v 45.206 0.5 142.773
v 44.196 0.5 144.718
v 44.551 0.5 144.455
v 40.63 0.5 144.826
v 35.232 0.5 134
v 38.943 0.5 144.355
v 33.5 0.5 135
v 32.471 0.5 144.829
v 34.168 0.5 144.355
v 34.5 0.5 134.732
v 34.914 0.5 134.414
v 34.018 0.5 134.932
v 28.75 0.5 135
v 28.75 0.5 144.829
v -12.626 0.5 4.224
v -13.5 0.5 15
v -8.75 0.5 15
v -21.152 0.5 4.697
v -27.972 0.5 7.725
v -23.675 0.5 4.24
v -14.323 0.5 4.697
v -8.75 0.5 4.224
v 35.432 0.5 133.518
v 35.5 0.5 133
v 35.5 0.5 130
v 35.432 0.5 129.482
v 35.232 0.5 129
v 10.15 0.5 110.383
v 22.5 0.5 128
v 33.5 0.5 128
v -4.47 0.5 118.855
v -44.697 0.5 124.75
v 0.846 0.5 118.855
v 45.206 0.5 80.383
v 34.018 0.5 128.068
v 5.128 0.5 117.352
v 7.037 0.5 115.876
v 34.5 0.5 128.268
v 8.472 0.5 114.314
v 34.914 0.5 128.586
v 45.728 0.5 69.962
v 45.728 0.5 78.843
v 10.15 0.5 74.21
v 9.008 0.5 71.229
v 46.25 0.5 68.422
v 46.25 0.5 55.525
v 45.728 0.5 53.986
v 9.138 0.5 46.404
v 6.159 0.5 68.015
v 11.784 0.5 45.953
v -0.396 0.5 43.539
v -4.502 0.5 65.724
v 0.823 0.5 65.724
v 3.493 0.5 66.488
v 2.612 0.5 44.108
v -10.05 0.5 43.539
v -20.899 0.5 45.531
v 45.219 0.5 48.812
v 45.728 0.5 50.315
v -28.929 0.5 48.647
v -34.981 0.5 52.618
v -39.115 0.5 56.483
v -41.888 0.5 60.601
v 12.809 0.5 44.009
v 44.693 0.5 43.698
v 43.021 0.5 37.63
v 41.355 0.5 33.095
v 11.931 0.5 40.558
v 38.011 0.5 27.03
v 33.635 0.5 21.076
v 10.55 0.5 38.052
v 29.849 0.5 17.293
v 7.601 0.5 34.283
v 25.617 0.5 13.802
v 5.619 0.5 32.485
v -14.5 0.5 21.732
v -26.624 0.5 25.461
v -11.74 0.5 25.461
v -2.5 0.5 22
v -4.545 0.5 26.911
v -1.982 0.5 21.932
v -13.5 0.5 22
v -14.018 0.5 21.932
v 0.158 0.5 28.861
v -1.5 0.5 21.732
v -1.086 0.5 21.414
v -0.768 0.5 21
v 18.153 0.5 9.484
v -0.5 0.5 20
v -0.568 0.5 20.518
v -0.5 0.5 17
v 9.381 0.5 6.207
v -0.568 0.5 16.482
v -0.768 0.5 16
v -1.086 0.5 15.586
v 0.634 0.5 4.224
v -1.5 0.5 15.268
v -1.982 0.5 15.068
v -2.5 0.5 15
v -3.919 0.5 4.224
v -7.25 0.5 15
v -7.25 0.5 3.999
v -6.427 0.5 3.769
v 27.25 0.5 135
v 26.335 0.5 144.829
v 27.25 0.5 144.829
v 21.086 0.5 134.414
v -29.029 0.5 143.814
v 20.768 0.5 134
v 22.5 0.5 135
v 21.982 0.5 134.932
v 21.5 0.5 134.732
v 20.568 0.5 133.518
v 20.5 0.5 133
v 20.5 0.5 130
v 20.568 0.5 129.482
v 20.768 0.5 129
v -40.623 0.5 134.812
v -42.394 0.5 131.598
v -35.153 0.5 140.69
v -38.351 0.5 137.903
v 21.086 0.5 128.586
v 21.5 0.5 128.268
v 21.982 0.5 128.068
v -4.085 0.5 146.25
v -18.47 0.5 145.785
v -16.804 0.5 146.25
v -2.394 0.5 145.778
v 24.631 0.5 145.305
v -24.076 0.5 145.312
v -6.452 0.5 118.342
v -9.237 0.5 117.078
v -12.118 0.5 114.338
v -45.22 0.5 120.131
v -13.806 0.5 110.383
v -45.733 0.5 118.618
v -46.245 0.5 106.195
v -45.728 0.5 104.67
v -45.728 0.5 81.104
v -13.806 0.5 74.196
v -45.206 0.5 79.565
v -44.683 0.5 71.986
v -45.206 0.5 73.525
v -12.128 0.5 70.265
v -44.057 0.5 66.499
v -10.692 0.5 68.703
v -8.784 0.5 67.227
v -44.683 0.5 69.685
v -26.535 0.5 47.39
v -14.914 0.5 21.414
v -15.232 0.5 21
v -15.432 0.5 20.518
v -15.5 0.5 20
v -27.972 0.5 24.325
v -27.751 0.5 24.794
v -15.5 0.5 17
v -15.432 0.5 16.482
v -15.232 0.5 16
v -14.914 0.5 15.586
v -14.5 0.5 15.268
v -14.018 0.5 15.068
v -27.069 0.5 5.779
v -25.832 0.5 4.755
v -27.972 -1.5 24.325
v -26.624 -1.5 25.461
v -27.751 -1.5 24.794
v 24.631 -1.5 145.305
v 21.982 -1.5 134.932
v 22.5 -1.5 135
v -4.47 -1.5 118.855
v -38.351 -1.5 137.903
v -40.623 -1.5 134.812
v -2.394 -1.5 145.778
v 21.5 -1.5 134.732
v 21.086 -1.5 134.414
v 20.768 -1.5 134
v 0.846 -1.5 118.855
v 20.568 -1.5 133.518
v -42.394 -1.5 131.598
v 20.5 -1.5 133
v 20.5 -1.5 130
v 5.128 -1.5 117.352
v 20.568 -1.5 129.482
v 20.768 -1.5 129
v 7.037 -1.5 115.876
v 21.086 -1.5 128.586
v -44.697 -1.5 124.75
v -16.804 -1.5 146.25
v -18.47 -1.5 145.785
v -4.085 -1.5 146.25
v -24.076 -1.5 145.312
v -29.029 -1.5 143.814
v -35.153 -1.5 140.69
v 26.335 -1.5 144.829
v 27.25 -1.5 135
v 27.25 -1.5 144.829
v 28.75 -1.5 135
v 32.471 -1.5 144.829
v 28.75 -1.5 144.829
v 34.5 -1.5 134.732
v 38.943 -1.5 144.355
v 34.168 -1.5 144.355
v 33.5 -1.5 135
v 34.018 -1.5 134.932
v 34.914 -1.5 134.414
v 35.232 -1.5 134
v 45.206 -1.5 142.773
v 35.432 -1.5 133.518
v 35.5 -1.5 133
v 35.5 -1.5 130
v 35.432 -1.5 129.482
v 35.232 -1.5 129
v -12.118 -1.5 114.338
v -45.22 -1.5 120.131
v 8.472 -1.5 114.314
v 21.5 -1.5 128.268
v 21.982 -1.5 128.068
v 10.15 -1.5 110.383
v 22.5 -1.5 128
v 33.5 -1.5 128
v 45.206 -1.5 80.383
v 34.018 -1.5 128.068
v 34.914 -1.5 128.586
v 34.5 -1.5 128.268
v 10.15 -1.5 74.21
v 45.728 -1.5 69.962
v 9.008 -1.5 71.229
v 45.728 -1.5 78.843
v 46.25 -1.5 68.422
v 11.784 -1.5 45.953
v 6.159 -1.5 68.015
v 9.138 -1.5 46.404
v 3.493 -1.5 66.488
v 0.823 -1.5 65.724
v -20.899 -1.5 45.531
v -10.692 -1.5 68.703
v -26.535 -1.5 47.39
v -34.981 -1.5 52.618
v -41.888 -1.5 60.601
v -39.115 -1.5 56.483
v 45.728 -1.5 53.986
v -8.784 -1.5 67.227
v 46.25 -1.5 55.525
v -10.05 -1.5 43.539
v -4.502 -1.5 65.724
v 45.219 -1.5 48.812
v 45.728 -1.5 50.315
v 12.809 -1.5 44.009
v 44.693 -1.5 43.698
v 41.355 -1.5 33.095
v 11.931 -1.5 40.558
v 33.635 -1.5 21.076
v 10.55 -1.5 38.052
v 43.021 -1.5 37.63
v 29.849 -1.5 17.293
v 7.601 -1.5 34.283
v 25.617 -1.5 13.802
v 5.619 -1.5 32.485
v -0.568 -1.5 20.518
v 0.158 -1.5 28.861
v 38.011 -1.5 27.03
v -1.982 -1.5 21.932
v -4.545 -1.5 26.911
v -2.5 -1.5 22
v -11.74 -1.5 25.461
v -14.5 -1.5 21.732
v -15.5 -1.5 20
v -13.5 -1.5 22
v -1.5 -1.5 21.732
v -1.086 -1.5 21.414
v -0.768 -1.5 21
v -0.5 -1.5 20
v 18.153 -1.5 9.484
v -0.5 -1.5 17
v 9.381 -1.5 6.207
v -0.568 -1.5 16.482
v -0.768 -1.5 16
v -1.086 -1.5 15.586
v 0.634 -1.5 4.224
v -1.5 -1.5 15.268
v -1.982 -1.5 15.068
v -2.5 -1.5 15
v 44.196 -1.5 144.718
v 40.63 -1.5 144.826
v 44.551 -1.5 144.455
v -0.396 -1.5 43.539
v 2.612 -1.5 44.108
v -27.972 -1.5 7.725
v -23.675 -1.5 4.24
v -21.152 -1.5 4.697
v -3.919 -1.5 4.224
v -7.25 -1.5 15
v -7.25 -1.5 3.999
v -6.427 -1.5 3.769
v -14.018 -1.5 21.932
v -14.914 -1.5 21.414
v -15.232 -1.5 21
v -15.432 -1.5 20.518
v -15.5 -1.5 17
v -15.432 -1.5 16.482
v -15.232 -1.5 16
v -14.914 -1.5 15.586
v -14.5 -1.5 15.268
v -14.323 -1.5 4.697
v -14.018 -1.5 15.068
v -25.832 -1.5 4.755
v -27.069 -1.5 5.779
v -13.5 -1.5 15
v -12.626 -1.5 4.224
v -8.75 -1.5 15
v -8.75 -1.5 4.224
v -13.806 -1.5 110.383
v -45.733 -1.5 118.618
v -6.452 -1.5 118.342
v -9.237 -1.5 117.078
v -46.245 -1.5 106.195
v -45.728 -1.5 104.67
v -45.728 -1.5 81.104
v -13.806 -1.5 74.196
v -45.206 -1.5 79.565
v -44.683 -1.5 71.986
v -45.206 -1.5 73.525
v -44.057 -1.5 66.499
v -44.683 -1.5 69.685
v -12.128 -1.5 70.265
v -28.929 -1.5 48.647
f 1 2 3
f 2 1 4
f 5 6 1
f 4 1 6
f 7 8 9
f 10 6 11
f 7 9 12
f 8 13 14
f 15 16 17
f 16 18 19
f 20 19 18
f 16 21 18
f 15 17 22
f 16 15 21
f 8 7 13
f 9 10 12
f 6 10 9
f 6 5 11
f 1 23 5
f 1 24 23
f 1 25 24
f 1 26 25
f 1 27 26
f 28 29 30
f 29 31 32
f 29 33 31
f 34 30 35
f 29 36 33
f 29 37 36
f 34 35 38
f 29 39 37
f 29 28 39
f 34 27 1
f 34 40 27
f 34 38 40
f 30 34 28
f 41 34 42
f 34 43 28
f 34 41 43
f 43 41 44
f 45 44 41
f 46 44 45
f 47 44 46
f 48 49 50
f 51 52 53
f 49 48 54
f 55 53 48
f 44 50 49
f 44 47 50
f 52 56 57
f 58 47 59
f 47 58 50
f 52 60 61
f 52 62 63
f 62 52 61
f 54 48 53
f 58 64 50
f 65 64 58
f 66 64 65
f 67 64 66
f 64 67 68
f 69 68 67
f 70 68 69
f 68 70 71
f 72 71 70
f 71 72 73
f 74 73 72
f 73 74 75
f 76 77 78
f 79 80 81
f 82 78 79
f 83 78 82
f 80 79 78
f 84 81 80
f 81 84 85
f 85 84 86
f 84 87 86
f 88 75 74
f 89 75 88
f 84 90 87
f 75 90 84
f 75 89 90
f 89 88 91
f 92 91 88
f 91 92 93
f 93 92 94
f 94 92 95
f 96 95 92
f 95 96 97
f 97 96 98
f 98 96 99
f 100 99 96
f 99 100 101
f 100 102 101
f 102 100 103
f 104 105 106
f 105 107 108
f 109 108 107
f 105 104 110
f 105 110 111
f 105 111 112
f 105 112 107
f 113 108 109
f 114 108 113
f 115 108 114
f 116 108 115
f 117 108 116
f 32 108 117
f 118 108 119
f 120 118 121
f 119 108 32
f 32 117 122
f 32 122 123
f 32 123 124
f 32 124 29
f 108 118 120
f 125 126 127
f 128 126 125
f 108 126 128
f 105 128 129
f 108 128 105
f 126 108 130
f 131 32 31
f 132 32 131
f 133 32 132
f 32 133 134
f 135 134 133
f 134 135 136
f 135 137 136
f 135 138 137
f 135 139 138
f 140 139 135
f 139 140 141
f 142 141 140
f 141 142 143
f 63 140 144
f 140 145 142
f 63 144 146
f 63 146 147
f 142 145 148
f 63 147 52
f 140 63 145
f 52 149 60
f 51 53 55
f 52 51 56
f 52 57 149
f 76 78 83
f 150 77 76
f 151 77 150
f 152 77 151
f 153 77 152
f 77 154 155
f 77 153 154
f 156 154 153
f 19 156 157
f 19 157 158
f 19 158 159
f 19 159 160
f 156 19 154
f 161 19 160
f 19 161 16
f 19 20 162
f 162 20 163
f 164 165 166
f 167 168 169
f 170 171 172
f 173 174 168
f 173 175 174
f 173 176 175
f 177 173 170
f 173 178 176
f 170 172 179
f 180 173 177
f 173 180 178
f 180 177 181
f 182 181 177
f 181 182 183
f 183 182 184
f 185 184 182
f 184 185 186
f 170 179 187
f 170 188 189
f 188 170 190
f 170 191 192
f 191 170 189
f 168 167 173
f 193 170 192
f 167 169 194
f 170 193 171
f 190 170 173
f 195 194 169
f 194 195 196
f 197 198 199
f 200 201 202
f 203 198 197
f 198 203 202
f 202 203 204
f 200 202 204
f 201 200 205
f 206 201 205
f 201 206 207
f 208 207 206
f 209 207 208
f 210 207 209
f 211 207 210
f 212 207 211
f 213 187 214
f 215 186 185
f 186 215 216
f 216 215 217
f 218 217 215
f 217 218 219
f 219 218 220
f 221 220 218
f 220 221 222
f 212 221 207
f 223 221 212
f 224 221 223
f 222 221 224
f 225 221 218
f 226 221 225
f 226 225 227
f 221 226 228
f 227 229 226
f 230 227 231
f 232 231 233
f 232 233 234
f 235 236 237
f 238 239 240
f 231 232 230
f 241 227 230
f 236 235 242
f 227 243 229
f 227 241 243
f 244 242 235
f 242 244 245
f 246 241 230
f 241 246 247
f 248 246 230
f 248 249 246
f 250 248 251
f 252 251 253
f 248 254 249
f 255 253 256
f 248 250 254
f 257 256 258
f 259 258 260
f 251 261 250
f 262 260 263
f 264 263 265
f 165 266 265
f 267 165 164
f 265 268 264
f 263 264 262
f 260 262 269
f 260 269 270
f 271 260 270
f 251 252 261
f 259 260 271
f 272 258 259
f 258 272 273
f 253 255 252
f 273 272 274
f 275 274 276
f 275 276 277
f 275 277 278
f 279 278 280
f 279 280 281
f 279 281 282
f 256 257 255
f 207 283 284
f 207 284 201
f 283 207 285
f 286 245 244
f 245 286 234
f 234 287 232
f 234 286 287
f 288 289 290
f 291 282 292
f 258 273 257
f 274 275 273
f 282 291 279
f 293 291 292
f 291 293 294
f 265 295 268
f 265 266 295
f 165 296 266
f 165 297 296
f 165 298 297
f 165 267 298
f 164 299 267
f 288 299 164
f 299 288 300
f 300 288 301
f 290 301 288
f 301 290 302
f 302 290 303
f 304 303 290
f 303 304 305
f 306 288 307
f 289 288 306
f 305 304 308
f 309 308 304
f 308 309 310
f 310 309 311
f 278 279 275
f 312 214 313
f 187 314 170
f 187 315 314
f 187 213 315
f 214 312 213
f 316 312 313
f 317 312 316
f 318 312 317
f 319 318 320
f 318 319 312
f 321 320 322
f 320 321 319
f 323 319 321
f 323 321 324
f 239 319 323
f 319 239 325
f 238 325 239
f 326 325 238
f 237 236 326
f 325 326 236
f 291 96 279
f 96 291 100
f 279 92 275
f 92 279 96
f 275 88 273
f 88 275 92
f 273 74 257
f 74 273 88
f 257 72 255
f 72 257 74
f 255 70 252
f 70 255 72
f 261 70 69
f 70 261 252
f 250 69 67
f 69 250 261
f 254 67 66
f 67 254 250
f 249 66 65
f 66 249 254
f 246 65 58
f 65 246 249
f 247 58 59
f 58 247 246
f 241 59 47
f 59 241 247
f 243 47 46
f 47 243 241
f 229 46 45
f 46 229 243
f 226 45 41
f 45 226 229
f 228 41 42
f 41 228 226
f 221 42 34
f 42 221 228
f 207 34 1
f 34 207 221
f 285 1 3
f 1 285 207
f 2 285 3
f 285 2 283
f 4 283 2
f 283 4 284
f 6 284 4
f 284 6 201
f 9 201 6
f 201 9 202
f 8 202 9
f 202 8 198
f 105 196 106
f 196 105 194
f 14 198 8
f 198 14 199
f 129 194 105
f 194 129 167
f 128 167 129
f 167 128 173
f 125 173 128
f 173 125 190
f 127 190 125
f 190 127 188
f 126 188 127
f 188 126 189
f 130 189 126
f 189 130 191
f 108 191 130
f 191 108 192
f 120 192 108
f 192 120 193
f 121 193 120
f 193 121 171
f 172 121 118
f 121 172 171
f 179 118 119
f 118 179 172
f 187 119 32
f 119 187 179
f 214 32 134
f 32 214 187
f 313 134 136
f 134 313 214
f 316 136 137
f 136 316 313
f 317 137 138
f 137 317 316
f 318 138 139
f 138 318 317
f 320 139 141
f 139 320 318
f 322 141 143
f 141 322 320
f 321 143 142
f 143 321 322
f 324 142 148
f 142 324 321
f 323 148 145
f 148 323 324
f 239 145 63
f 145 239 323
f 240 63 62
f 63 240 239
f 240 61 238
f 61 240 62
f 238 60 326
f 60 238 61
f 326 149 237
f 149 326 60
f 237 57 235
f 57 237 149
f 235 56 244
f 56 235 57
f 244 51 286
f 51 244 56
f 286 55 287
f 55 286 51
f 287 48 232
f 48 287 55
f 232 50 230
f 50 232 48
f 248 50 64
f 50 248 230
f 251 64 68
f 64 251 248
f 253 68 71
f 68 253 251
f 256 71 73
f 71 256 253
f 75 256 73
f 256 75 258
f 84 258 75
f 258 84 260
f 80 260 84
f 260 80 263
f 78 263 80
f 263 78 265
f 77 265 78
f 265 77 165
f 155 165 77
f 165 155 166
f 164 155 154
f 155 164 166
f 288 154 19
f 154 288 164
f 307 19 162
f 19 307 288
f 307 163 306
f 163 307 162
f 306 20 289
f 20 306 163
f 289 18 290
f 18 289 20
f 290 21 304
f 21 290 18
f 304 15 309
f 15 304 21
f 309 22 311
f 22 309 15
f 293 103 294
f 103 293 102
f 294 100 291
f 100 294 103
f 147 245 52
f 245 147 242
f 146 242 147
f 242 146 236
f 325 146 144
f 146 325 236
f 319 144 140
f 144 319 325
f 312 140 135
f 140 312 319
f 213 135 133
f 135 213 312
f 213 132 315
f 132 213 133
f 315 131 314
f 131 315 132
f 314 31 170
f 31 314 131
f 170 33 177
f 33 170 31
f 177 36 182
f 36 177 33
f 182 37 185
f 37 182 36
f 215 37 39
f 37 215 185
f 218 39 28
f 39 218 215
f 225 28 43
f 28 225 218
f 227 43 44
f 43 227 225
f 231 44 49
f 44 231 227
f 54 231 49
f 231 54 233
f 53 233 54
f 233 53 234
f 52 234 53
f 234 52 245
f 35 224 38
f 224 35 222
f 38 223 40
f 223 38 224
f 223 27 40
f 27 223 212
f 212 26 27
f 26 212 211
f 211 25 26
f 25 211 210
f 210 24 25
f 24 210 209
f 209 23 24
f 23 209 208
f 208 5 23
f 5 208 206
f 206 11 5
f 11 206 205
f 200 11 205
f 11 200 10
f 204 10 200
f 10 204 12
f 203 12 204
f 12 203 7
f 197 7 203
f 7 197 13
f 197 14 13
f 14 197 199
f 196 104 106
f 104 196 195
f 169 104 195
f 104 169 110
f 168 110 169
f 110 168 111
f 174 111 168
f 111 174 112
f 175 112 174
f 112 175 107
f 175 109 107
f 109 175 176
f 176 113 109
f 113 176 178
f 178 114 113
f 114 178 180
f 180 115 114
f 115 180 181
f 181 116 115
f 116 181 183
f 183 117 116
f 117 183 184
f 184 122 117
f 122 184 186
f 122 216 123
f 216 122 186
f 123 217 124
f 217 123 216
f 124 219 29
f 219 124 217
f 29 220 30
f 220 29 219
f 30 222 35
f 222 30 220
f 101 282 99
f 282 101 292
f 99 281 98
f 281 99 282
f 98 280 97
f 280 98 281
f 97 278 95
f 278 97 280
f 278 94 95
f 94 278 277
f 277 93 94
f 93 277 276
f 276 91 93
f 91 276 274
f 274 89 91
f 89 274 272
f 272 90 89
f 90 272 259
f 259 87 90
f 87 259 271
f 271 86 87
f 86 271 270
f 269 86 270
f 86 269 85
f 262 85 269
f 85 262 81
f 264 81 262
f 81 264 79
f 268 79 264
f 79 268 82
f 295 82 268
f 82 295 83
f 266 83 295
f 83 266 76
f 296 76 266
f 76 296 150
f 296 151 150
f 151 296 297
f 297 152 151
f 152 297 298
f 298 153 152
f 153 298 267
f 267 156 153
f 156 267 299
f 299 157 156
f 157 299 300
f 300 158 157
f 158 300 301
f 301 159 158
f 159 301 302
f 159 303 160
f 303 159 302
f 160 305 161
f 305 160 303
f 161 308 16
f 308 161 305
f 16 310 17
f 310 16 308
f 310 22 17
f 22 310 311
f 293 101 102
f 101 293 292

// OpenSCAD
// file: shape_pts.scad
// Letter "g" (#3) ? Top X=+28 Conduit (under n right leg) + Bottom X=-8 Conduit
// Vertical-display edition: bottom divider clip removed, interlocking hollow double-dovetail channels added.

shape_w = 94.00;
shape_h = 144.00;

rec_snap_top_x = 7.61;
rec_snap_top_z = 144.00;
rec_snap_bot_x = -8.51;

rec_top_conn_enable   = true;
rec_top_conn_x        = 28.00;
rec_bot_conn_enable   = true;
rec_bot_conn_x        = -8.00;
rec_left_conn_enable  = false;
rec_left_conn_z       = 0.00;
rec_left_conn_face_x  = 0.00;
rec_left_conn_pocket_x = 0.00;
rec_right_conn_enable = false;
rec_right_conn_z      = 0.00;
rec_right_conn_face_x = 0.00;
rec_right_conn_pocket_x = 0.00;

rec_magnet_enable = true;
rec_magnet_x      = -30.00;
rec_magnet_z      = 113.20;

rec_wall_mount_enable = false;
rec_wall_mount_x      = 27.50;
rec_wall_mount_z      = 88.00;

rec_include_controller = false;
rec_chip_x     = 27.50;
rec_chip_z     = 67.00;
rec_cable_x    = 27.50;
rec_ziptie_z   = 41.50;
rec_keyhole_z  = 27.50;
rec_slit_dir   = 1;

rec_pillars = [[-18.0, 132.0], [-30.0, 90.0], [27.5, 92.0], [27.5, 52.0]];
rec_has_face_grooves = false;

shape_pts = [[47.000,65.546],[47.000,52.401],[46.478,50.862],[46.478,47.191],[45.956,45.651],[45.433,40.559],[43.736,34.401],[42.039,29.783],[38.644,23.625],[34.206,17.586],[30.354,13.737],[26.046,10.184],[18.474,5.803],[9.596,2.487],[0.718,0.474],[-3.851,0.474],[-6.463,0.000],[-8.160,0.474],[-12.729,0.474],[-14.426,0.947],[-21.085,0.947],[-23.696,0.474],[-26.176,1.066],[-27.678,2.309],[-28.722,4.559],[-28.722,21.493],[-28.331,22.322],[-26.829,23.211],[-11.815,23.211],[-4.765,24.632],[-0.196,26.526],[5.157,30.079],[7.050,31.796],[9.922,35.467],[11.228,37.836],[12.011,40.914],[11.293,42.276],[9.204,42.632],[2.807,40.382],[-0.326,39.789],[-10.118,39.789],[-21.085,41.803],[-26.829,43.697],[-29.310,45.000],[-35.446,49.026],[-39.689,52.993],[-42.561,57.257],[-44.781,63.296],[-45.433,66.612],[-45.433,68.862],[-45.956,70.401],[-45.956,76.441],[-46.478,77.980],[-46.478,101.546],[-47.000,103.086],[-46.478,115.757],[-45.956,117.296],[-45.433,121.914],[-43.083,128.901],[-41.256,132.217],[-38.906,135.414],[-35.576,138.316],[-29.310,141.513],[-24.218,143.053],[-18.604,143.526],[-16.907,144.000],[-3.982,144.000],[-2.285,143.526],[24.740,143.053],[26.438,142.579],[32.574,142.579],[34.271,142.105],[38.840,142.105],[40.538,142.579],[44.454,142.461],[45.172,141.928],[45.956,139.914],[45.956,77.507],[46.478,75.967],[46.478,67.086],[-13.056,71.349],[-11.489,67.678],[-10.183,66.257],[-8.421,64.895],[-4.374,63.474],[0.718,63.474],[3.199,64.184],[5.679,65.605],[8.356,68.625],[9.400,71.349],[9.400,107.230],[7.833,110.901],[6.528,112.322],[4.765,113.684],[0.718,115.105],[-4.374,115.105],[-6.201,114.632],[-8.812,113.447],[-11.489,110.901],[-13.056,107.230]];
shape_paths = [[0, 1, 2, 3, 4, 5, 6, 7, 8, 9, 10, 11, 12, 13, 14, 15, 16, 17, 18, 19, 20, 21, 22, 23, 24, 25, 26, 27, 28, 29, 30, 31, 32, 33, 34, 35, 36, 37, 38, 39, 40, 41, 42, 43, 44, 45, 46, 47, 48, 49, 50, 51, 52, 53, 54, 55, 56, 57, 58, 59, 60, 61, 62, 63, 64, 65, 66, 67, 68, 69, 70, 71, 72, 73, 74, 75, 76, 77, 78, 79], [80, 81, 82, 83, 84, 85, 86, 87, 88, 89, 90, 91, 92, 93, 94, 95, 96, 97, 98, 99]];

diffuser_shape_pts = [[47.000,65.546],[47.000,52.401],[46.478,50.862],[46.478,47.191],[45.956,45.651],[45.433,40.559],[43.736,34.401],[42.039,29.783],[38.644,23.625],[34.206,17.586],[30.354,13.737],[26.046,10.184],[18.474,5.803],[9.596,2.487],[0.718,0.474],[-3.851,0.474],[-6.463,0.000],[-8.160,0.474],[-12.729,0.474],[-14.426,0.947],[-21.085,0.947],[-23.696,0.474],[-26.176,1.066],[-27.678,2.309],[-28.722,4.559],[-28.722,21.493],[-28.331,22.322],[-26.829,23.211],[-11.815,23.211],[-4.765,24.632],[-0.196,26.526],[5.157,30.079],[7.050,31.796],[9.922,35.467],[11.228,37.836],[12.011,40.914],[11.293,42.276],[9.204,42.632],[2.807,40.382],[-0.326,39.789],[-10.118,39.789],[-21.085,41.803],[-26.829,43.697],[-29.310,45.000],[-35.446,49.026],[-39.689,52.993],[-42.561,57.257],[-44.781,63.296],[-45.433,66.612],[-45.433,68.862],[-45.956,70.401],[-45.956,76.441],[-46.478,77.980],[-46.478,101.546],[-47.000,103.086],[-46.478,115.757],[-45.956,117.296],[-45.433,121.914],[-43.083,128.901],[-41.256,132.217],[-38.906,135.414],[-35.576,138.316],[-29.310,141.513],[-24.218,143.053],[-18.604,143.526],[-16.907,144.000],[-3.982,144.000],[-2.285,143.526],[24.740,143.053],[26.438,142.579],[32.574,142.579],[34.271,142.105],[38.840,142.105],[40.538,142.579],[44.454,142.461],[45.172,141.928],[45.956,139.914],[45.956,77.507],[46.478,75.967],[46.478,67.086],[-13.056,71.349],[-11.489,67.678],[-10.183,66.257],[-8.421,64.895],[-4.374,63.474],[0.718,63.474],[3.199,64.184],[5.679,65.605],[8.356,68.625],[9.400,71.349],[9.400,107.230],[7.833,110.901],[6.528,112.322],[4.765,113.684],[0.718,115.105],[-4.374,115.105],[-6.201,114.632],[-8.812,113.447],[-11.489,110.901],[-13.056,107.230]];
diffuser_shape_paths = [[0, 1, 2, 3, 4, 5, 6, 7, 8, 9, 10, 11, 12, 13, 14, 15, 16, 17, 18, 19, 20, 21, 22, 23, 24, 25, 26, 27, 28, 29, 30, 31, 32, 33, 34, 35, 36, 37, 38, 39, 40, 41, 42, 43, 44, 45, 46, 47, 48, 49, 50, 51, 52, 53, 54, 55, 56, 57, 58, 59, 60, 61, 62, 63, 64, 65, 66, 67, 68, 69, 70, 71, 72, 73, 74, 75, 76, 77, 78, 79], [80, 81, 82, 83, 84, 85, 86, 87, 88, 89, 90, 91, 92, 93, 94, 95, 96, 97, 98, 99]];

module shape_2d(pts = shape_pts) {
    polygon(points = pts, paths = shape_paths);
}

module diffuser_shape_2d(pts = diffuser_shape_pts) {
    polygon(points = pts, paths = diffuser_shape_paths);
}

module diffuser_face_grooves_2d() {}
// main file
// Letter "g" (#3) ? Top X=+28 Conduit (under n right leg) + Bottom X=-8 Conduit ? internal white reflector plate (2.00 mm thick, aligned LED-strip conduit pockets + entry slits)
// Opens and exports standalone in OpenSCAD / OpenSCAD.js.

use <lamp_core.scad>

render_lamp_part("reflector");
